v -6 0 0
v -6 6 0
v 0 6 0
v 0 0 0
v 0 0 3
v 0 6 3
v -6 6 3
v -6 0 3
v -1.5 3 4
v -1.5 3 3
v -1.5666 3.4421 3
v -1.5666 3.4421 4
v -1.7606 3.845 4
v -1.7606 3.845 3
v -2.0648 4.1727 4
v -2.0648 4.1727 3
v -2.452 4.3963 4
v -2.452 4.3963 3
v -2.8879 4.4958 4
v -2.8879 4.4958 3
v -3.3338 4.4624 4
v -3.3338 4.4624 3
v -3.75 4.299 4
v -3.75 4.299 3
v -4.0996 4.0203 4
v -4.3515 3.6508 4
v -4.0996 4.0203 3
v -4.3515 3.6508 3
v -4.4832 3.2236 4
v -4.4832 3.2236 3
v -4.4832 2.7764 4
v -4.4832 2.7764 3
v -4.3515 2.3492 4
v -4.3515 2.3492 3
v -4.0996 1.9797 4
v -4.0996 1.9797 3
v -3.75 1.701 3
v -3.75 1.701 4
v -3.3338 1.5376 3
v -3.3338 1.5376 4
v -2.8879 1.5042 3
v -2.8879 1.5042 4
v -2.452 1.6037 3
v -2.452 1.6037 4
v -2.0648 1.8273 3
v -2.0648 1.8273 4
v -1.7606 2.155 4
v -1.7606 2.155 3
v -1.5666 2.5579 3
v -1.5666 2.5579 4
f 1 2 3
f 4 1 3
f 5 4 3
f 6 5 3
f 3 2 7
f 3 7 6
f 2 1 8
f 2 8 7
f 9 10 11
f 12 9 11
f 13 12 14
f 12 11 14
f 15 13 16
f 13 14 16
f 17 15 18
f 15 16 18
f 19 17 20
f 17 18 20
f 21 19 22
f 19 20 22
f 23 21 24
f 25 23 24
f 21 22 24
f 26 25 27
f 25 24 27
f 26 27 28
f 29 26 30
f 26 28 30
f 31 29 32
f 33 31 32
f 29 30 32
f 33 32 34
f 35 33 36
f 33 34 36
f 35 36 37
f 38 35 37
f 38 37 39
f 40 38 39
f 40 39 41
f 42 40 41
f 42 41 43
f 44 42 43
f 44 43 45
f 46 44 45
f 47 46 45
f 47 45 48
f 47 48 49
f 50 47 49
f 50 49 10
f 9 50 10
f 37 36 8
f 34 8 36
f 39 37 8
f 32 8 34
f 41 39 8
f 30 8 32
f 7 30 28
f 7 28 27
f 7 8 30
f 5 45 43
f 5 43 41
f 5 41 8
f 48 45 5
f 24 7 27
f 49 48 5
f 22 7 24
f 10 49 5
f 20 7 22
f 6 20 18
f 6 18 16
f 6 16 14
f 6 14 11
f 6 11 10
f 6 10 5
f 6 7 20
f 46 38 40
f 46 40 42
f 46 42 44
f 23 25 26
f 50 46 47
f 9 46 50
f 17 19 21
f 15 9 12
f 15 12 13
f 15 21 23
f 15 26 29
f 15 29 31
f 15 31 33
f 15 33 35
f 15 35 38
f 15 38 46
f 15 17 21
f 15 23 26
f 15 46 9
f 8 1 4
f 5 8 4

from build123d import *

# Parameters (mm, degrees)
SKETCH_1_W      = 6
SKETCH_1_H      = 6
EXTRUDE_1_DEPTH = 3
SKETCH_1_3_R    = 1.5
EXTRUDE_2_DEPTH = 4


with BuildPart() as part:
    # Эскиз1 → Бобышка-Вытянуть1 (new body)
    with BuildSketch(Plane.XY):
        with Locations((-3, 3)):
            Rectangle(SKETCH_1_W, SKETCH_1_H)
    extrude(amount=EXTRUDE_1_DEPTH)

    # Эскиз1<3> → Бобышка-Вытянуть2 (add)
    with BuildSketch(Plane.XY):
        with Locations((-3, 3)):
            Circle(SKETCH_1_3_R)
    extrude(amount=EXTRUDE_2_DEPTH)


solid = part.part
